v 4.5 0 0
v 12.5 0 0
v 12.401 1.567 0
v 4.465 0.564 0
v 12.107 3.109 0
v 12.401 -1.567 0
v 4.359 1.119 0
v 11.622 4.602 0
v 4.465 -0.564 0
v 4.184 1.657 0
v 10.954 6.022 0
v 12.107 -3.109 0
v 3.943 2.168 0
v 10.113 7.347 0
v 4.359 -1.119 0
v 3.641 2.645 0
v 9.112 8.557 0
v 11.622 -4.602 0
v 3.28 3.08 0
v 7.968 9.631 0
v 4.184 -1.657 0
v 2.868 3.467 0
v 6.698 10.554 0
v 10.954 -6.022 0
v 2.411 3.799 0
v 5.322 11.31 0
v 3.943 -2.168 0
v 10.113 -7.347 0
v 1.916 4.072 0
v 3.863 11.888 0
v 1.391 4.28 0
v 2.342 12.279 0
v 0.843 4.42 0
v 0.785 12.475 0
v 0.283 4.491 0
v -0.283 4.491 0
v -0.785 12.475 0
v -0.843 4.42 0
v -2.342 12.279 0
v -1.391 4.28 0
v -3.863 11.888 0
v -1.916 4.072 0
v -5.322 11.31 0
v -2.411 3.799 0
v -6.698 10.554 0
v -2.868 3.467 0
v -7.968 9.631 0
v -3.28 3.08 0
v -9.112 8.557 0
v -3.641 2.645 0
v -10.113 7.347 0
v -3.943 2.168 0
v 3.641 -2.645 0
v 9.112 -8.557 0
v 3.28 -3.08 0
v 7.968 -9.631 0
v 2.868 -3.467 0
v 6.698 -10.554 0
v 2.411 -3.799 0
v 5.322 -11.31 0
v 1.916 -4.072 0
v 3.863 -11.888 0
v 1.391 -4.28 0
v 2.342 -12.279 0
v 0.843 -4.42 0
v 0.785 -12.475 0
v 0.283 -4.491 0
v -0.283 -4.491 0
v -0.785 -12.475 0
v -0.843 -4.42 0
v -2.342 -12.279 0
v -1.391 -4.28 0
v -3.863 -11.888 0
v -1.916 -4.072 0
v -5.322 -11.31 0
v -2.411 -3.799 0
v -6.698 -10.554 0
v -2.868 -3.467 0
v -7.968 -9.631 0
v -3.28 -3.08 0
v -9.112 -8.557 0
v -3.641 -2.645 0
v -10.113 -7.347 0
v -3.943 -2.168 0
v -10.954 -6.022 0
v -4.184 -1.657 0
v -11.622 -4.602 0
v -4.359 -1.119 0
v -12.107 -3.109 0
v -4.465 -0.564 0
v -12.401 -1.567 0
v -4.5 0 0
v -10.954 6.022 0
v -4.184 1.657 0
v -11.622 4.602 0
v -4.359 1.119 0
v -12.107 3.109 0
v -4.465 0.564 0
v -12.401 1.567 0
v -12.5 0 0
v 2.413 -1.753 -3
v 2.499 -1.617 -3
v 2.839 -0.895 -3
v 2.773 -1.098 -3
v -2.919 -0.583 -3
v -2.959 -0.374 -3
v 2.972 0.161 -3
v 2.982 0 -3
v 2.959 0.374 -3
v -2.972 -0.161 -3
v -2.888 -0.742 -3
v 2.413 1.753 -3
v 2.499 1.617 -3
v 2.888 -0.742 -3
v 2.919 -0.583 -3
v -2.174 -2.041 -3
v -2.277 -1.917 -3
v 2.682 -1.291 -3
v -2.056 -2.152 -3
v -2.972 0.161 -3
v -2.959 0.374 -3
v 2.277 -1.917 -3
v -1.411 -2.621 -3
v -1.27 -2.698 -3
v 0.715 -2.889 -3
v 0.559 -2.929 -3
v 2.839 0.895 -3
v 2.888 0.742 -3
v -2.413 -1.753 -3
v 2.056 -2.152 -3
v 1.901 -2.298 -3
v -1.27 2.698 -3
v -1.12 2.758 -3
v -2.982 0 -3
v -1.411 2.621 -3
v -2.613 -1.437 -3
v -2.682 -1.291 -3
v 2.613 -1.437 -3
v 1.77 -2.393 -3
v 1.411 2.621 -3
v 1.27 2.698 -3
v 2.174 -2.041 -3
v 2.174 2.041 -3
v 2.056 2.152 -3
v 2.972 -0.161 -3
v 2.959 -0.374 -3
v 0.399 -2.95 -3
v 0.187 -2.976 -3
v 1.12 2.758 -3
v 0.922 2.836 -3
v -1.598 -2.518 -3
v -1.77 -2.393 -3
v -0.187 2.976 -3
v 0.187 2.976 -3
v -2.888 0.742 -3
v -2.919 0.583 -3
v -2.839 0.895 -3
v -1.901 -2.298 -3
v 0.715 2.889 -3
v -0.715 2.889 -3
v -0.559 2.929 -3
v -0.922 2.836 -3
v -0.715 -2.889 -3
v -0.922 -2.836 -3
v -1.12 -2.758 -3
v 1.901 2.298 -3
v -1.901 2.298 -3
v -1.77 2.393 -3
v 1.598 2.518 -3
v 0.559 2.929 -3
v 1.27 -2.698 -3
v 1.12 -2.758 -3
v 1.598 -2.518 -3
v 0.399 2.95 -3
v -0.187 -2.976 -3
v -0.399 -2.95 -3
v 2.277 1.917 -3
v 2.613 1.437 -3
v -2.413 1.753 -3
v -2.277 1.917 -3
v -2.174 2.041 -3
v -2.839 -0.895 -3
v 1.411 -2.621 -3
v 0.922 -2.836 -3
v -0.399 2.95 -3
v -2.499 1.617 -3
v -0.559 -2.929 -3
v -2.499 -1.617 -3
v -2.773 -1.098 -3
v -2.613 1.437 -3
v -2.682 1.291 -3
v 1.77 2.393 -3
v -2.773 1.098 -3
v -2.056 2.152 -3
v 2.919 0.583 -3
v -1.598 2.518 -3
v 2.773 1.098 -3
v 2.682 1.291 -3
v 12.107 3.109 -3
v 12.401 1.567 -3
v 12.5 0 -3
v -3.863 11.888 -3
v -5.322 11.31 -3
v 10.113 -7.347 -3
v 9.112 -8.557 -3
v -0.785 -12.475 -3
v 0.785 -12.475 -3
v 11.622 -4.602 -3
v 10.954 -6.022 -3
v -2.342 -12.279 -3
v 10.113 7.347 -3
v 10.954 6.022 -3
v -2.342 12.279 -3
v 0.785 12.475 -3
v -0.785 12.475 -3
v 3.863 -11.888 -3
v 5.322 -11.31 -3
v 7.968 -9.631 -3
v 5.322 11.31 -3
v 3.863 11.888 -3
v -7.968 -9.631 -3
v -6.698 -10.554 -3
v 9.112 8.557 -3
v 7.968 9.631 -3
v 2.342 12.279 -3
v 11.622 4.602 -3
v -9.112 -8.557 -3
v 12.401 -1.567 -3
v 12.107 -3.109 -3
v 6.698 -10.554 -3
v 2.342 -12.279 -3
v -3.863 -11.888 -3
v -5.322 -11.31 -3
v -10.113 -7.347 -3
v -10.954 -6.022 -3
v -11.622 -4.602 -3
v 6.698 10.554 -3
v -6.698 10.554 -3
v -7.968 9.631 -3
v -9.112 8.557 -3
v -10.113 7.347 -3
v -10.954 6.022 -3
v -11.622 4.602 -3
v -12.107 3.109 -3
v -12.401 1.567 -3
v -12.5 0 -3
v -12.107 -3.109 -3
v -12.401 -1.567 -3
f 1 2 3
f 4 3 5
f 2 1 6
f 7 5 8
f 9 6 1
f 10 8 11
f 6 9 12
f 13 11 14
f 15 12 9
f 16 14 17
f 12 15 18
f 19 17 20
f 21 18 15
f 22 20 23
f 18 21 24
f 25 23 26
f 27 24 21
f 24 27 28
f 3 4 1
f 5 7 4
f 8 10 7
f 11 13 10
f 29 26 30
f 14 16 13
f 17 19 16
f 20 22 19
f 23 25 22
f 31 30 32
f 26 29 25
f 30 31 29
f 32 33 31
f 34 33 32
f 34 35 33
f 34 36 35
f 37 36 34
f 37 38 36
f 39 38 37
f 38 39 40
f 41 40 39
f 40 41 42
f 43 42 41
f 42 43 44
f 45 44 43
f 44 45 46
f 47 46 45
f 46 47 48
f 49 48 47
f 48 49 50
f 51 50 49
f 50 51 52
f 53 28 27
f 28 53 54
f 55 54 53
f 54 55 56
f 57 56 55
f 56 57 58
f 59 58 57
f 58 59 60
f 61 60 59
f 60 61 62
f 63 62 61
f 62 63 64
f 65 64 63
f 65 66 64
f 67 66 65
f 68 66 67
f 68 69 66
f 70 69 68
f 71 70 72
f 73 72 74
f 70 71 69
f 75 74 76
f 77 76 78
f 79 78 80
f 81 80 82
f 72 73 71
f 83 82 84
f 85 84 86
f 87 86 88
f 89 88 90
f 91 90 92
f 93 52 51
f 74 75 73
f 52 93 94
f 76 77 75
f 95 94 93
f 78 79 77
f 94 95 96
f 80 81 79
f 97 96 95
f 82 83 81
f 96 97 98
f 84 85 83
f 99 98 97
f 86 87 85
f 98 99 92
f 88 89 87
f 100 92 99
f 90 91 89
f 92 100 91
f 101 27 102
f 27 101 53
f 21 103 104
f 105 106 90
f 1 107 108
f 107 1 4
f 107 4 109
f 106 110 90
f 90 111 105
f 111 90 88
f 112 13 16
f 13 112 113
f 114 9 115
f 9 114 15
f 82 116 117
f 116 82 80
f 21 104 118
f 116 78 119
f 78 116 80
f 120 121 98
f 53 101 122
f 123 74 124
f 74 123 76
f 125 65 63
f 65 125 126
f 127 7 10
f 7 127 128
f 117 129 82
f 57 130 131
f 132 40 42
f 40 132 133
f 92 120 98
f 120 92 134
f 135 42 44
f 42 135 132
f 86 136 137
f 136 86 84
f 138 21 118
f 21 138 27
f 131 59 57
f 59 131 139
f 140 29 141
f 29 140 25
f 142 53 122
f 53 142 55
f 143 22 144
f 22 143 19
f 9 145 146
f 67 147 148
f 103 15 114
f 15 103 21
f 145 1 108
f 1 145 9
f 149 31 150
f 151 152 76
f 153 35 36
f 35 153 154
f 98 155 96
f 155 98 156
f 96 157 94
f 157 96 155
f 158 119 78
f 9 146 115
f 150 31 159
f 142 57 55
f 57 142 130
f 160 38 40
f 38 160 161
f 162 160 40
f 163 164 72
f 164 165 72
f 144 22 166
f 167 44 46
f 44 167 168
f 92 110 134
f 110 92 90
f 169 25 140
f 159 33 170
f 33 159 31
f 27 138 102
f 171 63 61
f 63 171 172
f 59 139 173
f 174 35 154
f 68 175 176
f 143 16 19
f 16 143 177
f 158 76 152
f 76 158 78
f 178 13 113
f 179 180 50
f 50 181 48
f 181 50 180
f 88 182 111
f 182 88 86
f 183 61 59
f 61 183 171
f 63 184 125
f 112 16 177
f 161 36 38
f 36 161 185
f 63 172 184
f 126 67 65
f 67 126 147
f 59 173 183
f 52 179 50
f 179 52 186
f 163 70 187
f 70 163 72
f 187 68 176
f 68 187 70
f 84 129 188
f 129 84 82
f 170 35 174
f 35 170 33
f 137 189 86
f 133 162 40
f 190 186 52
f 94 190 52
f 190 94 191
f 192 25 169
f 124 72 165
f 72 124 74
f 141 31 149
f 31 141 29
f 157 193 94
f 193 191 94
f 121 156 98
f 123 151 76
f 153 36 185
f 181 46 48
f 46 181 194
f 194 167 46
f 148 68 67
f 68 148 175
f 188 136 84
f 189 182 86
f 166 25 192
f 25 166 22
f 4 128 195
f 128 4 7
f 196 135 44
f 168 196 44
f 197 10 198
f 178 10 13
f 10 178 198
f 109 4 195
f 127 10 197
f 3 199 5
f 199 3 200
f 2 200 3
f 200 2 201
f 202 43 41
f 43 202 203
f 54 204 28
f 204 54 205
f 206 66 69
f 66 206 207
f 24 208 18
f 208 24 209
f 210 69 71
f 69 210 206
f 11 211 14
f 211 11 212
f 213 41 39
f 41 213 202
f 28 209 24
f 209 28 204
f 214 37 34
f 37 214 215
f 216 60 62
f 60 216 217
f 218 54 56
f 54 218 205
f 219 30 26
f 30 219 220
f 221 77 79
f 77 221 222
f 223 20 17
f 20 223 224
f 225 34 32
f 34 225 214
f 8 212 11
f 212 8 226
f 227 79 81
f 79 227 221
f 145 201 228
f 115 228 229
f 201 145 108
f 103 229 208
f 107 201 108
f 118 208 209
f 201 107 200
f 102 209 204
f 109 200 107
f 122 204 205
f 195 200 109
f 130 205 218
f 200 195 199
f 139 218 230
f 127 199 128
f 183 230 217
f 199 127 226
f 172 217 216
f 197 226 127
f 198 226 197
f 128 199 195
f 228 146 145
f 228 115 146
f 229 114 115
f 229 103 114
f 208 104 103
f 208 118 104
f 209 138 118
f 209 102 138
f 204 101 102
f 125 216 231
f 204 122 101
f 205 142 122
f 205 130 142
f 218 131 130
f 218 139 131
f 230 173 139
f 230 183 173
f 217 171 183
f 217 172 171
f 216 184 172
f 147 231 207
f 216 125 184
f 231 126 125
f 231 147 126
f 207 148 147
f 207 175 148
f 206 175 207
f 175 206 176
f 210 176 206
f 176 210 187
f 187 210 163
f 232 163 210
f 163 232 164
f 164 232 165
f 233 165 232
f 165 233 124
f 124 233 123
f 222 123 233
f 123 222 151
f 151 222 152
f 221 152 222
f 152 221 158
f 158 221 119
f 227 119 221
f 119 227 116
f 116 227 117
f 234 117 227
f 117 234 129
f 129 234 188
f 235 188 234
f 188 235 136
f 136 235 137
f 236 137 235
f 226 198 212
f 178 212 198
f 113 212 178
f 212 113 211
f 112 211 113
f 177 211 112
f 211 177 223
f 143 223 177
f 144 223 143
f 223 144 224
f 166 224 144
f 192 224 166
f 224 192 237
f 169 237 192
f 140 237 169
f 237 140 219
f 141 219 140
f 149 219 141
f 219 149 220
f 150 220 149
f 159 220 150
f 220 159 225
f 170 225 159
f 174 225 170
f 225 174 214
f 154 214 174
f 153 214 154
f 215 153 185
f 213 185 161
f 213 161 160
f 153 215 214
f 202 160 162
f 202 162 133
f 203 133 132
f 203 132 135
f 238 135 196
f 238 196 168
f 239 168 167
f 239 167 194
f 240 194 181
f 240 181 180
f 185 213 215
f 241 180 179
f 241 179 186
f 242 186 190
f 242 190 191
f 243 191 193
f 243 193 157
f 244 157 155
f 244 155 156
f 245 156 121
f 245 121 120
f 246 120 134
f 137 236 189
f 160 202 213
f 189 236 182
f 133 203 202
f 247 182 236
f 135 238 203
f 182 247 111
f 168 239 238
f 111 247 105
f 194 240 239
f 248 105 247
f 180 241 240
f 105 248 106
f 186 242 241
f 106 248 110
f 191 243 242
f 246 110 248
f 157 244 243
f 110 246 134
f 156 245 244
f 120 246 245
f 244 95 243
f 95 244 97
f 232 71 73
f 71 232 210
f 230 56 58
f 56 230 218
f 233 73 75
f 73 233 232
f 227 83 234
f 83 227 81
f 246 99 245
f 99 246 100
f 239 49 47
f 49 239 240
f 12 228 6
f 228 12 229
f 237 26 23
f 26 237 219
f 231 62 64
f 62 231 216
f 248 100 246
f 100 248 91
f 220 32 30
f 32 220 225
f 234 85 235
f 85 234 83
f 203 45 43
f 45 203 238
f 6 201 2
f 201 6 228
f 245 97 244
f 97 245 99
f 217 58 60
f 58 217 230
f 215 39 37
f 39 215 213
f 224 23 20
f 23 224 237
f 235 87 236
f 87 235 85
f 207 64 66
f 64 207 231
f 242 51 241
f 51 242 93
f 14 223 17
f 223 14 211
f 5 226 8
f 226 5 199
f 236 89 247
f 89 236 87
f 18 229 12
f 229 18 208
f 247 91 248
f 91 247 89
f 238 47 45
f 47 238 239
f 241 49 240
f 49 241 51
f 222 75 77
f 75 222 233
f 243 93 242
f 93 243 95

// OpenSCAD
$fn = 50;


difference() {
	union() {
		translate(v = [0, 0, -3.0000000000]) {
			cylinder(h = 3, r = 12.5000000000);
		}
	}
	union() {
		translate(v = [0, 0, 0]) {
			rotate(a = [0, 0, 0]) {
				difference() {
					union() {
						translate(v = [0, 0, -6.0000000000]) {
							cylinder(h = 6, r = 2.2500000000);
						}
						translate(v = [0, 0, -4.2000000000]) {
							cylinder(h = 4.2000000000, r1 = 2.3750000000, r2 = 4.5000000000);
						}
						translate(v = [0, 0, -6.0000000000]) {
							cylinder(h = 6, r = 2.3750000000);
						}
						translate(v = [0, 0, -6.0000000000]) {
							cylinder(h = 6, r = 2.2500000000);
						}
					}
					union();
				}
			}
		}
	}
}
